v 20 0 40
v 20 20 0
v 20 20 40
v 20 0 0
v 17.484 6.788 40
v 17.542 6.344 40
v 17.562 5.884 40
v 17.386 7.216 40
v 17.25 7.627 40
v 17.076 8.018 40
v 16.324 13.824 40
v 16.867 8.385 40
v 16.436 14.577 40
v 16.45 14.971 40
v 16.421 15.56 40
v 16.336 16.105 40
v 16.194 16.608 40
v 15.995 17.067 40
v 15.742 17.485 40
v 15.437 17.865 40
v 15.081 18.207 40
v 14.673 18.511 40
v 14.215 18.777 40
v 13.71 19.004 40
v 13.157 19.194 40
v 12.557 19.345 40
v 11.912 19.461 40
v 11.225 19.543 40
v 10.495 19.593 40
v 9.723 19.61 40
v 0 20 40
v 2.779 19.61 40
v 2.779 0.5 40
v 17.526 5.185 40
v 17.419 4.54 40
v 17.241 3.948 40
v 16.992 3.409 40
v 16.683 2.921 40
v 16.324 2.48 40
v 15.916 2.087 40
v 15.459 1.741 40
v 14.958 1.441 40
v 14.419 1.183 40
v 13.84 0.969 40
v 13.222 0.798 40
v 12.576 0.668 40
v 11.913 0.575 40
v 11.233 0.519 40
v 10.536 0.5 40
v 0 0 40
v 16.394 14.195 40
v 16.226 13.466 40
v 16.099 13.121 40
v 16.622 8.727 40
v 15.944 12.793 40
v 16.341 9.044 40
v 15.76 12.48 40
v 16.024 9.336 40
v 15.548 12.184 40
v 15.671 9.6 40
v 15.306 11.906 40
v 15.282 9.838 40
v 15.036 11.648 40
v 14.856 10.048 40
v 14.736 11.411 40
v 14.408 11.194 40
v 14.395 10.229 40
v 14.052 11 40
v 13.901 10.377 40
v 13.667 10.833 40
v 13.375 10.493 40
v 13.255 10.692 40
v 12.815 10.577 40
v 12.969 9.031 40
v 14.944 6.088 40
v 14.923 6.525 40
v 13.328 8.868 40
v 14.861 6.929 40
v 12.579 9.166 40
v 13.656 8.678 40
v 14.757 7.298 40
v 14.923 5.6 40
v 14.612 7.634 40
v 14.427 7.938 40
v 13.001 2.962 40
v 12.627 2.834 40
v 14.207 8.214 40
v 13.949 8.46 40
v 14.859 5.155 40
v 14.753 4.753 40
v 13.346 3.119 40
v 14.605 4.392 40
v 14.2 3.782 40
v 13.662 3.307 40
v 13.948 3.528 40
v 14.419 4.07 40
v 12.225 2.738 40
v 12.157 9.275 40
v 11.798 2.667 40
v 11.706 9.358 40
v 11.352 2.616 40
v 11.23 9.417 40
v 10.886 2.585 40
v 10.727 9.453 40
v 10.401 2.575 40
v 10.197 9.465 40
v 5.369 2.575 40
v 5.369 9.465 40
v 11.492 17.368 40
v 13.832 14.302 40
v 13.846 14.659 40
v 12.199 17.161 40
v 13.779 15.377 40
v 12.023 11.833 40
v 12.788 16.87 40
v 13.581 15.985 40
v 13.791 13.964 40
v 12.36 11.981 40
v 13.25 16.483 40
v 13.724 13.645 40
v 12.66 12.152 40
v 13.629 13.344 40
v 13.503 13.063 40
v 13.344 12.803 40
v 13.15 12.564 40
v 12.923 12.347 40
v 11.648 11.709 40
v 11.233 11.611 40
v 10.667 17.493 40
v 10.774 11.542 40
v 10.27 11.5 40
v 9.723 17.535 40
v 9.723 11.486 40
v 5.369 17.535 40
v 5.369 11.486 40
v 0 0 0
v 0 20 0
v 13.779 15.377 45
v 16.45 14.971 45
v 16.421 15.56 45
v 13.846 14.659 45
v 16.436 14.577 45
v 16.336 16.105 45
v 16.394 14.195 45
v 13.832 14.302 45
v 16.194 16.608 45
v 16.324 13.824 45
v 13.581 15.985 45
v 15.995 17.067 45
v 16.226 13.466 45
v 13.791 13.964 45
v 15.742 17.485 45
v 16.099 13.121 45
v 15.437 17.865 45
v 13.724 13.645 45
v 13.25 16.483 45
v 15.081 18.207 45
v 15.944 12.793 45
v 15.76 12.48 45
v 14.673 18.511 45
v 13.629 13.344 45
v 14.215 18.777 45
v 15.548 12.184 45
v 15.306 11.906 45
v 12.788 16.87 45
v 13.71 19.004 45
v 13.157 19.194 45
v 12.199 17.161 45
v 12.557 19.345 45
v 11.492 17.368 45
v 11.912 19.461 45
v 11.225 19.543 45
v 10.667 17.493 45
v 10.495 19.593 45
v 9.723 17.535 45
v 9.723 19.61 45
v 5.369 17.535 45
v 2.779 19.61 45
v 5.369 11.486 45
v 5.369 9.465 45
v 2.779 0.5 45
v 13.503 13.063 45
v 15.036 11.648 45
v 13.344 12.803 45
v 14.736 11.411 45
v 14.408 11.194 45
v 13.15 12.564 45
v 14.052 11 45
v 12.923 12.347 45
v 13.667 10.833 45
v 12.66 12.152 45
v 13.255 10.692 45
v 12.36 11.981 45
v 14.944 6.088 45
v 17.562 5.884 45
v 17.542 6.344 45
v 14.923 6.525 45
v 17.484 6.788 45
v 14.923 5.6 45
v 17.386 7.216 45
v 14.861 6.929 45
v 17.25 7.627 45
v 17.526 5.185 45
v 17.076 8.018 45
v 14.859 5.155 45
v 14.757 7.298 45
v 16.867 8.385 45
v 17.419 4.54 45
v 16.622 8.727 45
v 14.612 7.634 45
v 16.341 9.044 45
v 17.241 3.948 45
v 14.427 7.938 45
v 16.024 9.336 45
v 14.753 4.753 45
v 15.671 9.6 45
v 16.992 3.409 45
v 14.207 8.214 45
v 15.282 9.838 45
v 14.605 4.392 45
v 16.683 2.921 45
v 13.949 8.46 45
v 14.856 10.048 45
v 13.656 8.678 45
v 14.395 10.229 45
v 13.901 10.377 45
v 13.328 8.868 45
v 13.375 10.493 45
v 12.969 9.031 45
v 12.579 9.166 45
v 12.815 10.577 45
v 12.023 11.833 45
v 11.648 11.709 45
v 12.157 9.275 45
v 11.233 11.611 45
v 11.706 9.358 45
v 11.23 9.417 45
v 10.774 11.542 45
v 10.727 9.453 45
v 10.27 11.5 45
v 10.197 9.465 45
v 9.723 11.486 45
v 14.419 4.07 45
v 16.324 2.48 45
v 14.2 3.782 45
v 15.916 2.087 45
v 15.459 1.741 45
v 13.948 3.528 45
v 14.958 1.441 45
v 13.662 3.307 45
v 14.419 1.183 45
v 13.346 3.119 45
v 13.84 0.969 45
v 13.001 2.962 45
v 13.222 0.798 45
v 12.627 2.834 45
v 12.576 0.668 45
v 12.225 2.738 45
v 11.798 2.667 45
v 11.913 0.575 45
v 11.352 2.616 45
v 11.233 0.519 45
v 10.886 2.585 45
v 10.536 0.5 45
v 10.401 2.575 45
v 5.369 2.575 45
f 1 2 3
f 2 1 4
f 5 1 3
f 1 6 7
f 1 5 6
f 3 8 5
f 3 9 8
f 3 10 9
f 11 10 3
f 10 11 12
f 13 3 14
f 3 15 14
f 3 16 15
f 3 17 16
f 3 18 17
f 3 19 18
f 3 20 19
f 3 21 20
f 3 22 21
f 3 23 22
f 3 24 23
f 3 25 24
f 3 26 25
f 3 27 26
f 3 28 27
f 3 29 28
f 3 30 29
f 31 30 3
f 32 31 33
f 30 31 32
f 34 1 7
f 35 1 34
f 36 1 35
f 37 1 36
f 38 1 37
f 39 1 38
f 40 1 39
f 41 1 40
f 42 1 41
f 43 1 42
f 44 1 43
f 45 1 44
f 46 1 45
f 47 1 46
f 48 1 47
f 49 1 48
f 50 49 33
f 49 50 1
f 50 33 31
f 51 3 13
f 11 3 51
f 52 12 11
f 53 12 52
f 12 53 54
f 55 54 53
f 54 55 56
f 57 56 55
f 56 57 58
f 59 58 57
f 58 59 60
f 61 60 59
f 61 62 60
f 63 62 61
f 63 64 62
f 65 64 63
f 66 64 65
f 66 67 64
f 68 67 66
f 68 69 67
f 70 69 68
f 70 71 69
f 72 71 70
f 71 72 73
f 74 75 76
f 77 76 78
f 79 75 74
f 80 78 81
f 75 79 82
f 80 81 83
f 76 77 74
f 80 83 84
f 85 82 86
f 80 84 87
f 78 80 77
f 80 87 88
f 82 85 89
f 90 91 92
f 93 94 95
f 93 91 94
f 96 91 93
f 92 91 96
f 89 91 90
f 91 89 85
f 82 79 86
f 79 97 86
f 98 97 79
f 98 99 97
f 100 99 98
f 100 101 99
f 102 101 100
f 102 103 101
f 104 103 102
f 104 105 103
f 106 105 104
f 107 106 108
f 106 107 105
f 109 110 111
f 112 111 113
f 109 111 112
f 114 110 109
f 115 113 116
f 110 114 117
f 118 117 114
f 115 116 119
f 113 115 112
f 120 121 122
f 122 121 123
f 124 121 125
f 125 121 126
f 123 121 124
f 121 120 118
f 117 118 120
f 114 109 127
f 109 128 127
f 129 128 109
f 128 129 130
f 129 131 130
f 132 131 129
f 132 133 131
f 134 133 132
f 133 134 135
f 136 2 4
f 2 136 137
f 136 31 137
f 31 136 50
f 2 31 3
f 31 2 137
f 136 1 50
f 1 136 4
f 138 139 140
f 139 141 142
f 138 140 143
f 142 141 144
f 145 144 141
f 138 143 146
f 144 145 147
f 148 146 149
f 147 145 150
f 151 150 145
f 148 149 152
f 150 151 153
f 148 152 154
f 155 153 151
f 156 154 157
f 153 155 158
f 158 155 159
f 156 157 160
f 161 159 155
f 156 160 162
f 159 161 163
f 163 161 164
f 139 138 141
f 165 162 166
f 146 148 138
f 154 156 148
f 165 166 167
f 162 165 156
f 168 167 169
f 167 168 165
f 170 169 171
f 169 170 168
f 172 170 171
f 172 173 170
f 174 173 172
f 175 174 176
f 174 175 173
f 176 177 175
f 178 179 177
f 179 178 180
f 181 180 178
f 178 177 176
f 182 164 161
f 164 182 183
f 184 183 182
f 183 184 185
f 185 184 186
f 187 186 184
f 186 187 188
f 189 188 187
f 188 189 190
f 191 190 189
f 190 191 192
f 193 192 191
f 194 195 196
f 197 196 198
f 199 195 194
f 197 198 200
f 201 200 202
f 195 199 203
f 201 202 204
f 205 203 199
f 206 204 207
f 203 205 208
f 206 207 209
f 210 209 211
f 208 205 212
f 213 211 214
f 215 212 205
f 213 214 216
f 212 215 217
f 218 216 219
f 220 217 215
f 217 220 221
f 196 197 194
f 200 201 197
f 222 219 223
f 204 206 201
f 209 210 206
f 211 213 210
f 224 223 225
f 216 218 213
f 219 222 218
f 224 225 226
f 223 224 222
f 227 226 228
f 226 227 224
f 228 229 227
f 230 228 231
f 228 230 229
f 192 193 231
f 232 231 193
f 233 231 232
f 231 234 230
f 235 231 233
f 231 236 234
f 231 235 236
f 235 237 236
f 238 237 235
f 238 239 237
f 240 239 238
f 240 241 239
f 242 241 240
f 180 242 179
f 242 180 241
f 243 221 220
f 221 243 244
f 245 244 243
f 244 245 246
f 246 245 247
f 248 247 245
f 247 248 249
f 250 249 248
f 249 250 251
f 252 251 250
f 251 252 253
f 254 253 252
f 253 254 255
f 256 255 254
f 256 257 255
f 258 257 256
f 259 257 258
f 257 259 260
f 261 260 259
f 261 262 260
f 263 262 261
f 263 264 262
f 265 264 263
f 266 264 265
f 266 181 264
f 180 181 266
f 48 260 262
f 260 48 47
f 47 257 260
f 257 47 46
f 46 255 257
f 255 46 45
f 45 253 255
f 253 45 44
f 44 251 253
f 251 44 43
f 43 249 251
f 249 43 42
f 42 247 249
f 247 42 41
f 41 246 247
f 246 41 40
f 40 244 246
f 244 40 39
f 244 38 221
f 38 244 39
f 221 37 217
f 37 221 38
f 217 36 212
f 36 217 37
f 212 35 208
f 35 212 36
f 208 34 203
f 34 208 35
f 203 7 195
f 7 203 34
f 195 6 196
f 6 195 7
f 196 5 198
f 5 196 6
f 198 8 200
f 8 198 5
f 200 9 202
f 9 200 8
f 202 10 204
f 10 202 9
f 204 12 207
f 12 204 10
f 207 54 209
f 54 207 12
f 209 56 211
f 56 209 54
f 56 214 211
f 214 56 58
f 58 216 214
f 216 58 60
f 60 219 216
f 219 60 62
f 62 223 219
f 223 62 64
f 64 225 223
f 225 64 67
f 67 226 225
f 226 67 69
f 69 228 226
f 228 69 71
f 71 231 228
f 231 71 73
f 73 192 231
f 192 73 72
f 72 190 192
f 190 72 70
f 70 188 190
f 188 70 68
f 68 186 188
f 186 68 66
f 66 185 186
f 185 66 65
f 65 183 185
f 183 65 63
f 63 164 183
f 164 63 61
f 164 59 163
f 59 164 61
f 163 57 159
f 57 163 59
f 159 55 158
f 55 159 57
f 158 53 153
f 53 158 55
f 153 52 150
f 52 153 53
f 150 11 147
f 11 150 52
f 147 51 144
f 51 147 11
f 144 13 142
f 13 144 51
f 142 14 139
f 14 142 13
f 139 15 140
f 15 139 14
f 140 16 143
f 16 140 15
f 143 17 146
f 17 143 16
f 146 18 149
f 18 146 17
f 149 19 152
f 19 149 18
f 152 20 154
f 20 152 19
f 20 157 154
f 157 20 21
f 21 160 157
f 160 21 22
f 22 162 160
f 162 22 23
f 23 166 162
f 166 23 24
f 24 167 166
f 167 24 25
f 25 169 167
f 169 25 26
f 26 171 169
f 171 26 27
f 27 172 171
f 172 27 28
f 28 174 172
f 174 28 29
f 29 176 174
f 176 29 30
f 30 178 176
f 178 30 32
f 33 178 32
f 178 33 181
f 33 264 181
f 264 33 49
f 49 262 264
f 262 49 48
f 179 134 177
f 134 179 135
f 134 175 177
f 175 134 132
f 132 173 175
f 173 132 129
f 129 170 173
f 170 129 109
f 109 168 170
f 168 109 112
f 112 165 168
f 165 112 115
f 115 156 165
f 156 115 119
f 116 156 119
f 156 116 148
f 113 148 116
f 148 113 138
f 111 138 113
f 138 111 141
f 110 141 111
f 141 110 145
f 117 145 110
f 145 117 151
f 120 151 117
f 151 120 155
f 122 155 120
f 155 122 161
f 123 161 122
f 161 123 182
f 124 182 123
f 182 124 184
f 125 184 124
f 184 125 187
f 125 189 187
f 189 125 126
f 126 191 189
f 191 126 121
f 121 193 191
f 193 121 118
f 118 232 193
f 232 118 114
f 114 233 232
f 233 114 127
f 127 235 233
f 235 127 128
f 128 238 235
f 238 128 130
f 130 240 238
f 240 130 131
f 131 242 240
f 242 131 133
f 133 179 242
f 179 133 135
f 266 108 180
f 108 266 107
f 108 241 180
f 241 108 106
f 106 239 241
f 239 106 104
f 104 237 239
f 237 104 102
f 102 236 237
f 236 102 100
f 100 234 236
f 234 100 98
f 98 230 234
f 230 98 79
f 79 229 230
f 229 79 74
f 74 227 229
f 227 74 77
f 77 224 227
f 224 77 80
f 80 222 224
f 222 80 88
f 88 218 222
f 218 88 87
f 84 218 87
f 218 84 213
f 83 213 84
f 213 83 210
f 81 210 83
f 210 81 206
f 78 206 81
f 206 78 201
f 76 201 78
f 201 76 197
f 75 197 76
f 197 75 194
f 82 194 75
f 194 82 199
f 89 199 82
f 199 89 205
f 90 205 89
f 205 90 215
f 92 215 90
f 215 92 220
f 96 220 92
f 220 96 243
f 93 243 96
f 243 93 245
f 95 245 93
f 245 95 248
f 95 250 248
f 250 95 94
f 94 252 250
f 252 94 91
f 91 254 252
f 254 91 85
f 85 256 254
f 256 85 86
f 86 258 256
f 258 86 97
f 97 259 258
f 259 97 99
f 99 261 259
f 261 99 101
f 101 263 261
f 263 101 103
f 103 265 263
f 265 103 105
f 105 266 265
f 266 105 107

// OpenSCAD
cube([20, 20, 40]);
translate([0.5, 0.5, 40]){
    linear_extrude(5){
        text("B", size=20);
    }
}
